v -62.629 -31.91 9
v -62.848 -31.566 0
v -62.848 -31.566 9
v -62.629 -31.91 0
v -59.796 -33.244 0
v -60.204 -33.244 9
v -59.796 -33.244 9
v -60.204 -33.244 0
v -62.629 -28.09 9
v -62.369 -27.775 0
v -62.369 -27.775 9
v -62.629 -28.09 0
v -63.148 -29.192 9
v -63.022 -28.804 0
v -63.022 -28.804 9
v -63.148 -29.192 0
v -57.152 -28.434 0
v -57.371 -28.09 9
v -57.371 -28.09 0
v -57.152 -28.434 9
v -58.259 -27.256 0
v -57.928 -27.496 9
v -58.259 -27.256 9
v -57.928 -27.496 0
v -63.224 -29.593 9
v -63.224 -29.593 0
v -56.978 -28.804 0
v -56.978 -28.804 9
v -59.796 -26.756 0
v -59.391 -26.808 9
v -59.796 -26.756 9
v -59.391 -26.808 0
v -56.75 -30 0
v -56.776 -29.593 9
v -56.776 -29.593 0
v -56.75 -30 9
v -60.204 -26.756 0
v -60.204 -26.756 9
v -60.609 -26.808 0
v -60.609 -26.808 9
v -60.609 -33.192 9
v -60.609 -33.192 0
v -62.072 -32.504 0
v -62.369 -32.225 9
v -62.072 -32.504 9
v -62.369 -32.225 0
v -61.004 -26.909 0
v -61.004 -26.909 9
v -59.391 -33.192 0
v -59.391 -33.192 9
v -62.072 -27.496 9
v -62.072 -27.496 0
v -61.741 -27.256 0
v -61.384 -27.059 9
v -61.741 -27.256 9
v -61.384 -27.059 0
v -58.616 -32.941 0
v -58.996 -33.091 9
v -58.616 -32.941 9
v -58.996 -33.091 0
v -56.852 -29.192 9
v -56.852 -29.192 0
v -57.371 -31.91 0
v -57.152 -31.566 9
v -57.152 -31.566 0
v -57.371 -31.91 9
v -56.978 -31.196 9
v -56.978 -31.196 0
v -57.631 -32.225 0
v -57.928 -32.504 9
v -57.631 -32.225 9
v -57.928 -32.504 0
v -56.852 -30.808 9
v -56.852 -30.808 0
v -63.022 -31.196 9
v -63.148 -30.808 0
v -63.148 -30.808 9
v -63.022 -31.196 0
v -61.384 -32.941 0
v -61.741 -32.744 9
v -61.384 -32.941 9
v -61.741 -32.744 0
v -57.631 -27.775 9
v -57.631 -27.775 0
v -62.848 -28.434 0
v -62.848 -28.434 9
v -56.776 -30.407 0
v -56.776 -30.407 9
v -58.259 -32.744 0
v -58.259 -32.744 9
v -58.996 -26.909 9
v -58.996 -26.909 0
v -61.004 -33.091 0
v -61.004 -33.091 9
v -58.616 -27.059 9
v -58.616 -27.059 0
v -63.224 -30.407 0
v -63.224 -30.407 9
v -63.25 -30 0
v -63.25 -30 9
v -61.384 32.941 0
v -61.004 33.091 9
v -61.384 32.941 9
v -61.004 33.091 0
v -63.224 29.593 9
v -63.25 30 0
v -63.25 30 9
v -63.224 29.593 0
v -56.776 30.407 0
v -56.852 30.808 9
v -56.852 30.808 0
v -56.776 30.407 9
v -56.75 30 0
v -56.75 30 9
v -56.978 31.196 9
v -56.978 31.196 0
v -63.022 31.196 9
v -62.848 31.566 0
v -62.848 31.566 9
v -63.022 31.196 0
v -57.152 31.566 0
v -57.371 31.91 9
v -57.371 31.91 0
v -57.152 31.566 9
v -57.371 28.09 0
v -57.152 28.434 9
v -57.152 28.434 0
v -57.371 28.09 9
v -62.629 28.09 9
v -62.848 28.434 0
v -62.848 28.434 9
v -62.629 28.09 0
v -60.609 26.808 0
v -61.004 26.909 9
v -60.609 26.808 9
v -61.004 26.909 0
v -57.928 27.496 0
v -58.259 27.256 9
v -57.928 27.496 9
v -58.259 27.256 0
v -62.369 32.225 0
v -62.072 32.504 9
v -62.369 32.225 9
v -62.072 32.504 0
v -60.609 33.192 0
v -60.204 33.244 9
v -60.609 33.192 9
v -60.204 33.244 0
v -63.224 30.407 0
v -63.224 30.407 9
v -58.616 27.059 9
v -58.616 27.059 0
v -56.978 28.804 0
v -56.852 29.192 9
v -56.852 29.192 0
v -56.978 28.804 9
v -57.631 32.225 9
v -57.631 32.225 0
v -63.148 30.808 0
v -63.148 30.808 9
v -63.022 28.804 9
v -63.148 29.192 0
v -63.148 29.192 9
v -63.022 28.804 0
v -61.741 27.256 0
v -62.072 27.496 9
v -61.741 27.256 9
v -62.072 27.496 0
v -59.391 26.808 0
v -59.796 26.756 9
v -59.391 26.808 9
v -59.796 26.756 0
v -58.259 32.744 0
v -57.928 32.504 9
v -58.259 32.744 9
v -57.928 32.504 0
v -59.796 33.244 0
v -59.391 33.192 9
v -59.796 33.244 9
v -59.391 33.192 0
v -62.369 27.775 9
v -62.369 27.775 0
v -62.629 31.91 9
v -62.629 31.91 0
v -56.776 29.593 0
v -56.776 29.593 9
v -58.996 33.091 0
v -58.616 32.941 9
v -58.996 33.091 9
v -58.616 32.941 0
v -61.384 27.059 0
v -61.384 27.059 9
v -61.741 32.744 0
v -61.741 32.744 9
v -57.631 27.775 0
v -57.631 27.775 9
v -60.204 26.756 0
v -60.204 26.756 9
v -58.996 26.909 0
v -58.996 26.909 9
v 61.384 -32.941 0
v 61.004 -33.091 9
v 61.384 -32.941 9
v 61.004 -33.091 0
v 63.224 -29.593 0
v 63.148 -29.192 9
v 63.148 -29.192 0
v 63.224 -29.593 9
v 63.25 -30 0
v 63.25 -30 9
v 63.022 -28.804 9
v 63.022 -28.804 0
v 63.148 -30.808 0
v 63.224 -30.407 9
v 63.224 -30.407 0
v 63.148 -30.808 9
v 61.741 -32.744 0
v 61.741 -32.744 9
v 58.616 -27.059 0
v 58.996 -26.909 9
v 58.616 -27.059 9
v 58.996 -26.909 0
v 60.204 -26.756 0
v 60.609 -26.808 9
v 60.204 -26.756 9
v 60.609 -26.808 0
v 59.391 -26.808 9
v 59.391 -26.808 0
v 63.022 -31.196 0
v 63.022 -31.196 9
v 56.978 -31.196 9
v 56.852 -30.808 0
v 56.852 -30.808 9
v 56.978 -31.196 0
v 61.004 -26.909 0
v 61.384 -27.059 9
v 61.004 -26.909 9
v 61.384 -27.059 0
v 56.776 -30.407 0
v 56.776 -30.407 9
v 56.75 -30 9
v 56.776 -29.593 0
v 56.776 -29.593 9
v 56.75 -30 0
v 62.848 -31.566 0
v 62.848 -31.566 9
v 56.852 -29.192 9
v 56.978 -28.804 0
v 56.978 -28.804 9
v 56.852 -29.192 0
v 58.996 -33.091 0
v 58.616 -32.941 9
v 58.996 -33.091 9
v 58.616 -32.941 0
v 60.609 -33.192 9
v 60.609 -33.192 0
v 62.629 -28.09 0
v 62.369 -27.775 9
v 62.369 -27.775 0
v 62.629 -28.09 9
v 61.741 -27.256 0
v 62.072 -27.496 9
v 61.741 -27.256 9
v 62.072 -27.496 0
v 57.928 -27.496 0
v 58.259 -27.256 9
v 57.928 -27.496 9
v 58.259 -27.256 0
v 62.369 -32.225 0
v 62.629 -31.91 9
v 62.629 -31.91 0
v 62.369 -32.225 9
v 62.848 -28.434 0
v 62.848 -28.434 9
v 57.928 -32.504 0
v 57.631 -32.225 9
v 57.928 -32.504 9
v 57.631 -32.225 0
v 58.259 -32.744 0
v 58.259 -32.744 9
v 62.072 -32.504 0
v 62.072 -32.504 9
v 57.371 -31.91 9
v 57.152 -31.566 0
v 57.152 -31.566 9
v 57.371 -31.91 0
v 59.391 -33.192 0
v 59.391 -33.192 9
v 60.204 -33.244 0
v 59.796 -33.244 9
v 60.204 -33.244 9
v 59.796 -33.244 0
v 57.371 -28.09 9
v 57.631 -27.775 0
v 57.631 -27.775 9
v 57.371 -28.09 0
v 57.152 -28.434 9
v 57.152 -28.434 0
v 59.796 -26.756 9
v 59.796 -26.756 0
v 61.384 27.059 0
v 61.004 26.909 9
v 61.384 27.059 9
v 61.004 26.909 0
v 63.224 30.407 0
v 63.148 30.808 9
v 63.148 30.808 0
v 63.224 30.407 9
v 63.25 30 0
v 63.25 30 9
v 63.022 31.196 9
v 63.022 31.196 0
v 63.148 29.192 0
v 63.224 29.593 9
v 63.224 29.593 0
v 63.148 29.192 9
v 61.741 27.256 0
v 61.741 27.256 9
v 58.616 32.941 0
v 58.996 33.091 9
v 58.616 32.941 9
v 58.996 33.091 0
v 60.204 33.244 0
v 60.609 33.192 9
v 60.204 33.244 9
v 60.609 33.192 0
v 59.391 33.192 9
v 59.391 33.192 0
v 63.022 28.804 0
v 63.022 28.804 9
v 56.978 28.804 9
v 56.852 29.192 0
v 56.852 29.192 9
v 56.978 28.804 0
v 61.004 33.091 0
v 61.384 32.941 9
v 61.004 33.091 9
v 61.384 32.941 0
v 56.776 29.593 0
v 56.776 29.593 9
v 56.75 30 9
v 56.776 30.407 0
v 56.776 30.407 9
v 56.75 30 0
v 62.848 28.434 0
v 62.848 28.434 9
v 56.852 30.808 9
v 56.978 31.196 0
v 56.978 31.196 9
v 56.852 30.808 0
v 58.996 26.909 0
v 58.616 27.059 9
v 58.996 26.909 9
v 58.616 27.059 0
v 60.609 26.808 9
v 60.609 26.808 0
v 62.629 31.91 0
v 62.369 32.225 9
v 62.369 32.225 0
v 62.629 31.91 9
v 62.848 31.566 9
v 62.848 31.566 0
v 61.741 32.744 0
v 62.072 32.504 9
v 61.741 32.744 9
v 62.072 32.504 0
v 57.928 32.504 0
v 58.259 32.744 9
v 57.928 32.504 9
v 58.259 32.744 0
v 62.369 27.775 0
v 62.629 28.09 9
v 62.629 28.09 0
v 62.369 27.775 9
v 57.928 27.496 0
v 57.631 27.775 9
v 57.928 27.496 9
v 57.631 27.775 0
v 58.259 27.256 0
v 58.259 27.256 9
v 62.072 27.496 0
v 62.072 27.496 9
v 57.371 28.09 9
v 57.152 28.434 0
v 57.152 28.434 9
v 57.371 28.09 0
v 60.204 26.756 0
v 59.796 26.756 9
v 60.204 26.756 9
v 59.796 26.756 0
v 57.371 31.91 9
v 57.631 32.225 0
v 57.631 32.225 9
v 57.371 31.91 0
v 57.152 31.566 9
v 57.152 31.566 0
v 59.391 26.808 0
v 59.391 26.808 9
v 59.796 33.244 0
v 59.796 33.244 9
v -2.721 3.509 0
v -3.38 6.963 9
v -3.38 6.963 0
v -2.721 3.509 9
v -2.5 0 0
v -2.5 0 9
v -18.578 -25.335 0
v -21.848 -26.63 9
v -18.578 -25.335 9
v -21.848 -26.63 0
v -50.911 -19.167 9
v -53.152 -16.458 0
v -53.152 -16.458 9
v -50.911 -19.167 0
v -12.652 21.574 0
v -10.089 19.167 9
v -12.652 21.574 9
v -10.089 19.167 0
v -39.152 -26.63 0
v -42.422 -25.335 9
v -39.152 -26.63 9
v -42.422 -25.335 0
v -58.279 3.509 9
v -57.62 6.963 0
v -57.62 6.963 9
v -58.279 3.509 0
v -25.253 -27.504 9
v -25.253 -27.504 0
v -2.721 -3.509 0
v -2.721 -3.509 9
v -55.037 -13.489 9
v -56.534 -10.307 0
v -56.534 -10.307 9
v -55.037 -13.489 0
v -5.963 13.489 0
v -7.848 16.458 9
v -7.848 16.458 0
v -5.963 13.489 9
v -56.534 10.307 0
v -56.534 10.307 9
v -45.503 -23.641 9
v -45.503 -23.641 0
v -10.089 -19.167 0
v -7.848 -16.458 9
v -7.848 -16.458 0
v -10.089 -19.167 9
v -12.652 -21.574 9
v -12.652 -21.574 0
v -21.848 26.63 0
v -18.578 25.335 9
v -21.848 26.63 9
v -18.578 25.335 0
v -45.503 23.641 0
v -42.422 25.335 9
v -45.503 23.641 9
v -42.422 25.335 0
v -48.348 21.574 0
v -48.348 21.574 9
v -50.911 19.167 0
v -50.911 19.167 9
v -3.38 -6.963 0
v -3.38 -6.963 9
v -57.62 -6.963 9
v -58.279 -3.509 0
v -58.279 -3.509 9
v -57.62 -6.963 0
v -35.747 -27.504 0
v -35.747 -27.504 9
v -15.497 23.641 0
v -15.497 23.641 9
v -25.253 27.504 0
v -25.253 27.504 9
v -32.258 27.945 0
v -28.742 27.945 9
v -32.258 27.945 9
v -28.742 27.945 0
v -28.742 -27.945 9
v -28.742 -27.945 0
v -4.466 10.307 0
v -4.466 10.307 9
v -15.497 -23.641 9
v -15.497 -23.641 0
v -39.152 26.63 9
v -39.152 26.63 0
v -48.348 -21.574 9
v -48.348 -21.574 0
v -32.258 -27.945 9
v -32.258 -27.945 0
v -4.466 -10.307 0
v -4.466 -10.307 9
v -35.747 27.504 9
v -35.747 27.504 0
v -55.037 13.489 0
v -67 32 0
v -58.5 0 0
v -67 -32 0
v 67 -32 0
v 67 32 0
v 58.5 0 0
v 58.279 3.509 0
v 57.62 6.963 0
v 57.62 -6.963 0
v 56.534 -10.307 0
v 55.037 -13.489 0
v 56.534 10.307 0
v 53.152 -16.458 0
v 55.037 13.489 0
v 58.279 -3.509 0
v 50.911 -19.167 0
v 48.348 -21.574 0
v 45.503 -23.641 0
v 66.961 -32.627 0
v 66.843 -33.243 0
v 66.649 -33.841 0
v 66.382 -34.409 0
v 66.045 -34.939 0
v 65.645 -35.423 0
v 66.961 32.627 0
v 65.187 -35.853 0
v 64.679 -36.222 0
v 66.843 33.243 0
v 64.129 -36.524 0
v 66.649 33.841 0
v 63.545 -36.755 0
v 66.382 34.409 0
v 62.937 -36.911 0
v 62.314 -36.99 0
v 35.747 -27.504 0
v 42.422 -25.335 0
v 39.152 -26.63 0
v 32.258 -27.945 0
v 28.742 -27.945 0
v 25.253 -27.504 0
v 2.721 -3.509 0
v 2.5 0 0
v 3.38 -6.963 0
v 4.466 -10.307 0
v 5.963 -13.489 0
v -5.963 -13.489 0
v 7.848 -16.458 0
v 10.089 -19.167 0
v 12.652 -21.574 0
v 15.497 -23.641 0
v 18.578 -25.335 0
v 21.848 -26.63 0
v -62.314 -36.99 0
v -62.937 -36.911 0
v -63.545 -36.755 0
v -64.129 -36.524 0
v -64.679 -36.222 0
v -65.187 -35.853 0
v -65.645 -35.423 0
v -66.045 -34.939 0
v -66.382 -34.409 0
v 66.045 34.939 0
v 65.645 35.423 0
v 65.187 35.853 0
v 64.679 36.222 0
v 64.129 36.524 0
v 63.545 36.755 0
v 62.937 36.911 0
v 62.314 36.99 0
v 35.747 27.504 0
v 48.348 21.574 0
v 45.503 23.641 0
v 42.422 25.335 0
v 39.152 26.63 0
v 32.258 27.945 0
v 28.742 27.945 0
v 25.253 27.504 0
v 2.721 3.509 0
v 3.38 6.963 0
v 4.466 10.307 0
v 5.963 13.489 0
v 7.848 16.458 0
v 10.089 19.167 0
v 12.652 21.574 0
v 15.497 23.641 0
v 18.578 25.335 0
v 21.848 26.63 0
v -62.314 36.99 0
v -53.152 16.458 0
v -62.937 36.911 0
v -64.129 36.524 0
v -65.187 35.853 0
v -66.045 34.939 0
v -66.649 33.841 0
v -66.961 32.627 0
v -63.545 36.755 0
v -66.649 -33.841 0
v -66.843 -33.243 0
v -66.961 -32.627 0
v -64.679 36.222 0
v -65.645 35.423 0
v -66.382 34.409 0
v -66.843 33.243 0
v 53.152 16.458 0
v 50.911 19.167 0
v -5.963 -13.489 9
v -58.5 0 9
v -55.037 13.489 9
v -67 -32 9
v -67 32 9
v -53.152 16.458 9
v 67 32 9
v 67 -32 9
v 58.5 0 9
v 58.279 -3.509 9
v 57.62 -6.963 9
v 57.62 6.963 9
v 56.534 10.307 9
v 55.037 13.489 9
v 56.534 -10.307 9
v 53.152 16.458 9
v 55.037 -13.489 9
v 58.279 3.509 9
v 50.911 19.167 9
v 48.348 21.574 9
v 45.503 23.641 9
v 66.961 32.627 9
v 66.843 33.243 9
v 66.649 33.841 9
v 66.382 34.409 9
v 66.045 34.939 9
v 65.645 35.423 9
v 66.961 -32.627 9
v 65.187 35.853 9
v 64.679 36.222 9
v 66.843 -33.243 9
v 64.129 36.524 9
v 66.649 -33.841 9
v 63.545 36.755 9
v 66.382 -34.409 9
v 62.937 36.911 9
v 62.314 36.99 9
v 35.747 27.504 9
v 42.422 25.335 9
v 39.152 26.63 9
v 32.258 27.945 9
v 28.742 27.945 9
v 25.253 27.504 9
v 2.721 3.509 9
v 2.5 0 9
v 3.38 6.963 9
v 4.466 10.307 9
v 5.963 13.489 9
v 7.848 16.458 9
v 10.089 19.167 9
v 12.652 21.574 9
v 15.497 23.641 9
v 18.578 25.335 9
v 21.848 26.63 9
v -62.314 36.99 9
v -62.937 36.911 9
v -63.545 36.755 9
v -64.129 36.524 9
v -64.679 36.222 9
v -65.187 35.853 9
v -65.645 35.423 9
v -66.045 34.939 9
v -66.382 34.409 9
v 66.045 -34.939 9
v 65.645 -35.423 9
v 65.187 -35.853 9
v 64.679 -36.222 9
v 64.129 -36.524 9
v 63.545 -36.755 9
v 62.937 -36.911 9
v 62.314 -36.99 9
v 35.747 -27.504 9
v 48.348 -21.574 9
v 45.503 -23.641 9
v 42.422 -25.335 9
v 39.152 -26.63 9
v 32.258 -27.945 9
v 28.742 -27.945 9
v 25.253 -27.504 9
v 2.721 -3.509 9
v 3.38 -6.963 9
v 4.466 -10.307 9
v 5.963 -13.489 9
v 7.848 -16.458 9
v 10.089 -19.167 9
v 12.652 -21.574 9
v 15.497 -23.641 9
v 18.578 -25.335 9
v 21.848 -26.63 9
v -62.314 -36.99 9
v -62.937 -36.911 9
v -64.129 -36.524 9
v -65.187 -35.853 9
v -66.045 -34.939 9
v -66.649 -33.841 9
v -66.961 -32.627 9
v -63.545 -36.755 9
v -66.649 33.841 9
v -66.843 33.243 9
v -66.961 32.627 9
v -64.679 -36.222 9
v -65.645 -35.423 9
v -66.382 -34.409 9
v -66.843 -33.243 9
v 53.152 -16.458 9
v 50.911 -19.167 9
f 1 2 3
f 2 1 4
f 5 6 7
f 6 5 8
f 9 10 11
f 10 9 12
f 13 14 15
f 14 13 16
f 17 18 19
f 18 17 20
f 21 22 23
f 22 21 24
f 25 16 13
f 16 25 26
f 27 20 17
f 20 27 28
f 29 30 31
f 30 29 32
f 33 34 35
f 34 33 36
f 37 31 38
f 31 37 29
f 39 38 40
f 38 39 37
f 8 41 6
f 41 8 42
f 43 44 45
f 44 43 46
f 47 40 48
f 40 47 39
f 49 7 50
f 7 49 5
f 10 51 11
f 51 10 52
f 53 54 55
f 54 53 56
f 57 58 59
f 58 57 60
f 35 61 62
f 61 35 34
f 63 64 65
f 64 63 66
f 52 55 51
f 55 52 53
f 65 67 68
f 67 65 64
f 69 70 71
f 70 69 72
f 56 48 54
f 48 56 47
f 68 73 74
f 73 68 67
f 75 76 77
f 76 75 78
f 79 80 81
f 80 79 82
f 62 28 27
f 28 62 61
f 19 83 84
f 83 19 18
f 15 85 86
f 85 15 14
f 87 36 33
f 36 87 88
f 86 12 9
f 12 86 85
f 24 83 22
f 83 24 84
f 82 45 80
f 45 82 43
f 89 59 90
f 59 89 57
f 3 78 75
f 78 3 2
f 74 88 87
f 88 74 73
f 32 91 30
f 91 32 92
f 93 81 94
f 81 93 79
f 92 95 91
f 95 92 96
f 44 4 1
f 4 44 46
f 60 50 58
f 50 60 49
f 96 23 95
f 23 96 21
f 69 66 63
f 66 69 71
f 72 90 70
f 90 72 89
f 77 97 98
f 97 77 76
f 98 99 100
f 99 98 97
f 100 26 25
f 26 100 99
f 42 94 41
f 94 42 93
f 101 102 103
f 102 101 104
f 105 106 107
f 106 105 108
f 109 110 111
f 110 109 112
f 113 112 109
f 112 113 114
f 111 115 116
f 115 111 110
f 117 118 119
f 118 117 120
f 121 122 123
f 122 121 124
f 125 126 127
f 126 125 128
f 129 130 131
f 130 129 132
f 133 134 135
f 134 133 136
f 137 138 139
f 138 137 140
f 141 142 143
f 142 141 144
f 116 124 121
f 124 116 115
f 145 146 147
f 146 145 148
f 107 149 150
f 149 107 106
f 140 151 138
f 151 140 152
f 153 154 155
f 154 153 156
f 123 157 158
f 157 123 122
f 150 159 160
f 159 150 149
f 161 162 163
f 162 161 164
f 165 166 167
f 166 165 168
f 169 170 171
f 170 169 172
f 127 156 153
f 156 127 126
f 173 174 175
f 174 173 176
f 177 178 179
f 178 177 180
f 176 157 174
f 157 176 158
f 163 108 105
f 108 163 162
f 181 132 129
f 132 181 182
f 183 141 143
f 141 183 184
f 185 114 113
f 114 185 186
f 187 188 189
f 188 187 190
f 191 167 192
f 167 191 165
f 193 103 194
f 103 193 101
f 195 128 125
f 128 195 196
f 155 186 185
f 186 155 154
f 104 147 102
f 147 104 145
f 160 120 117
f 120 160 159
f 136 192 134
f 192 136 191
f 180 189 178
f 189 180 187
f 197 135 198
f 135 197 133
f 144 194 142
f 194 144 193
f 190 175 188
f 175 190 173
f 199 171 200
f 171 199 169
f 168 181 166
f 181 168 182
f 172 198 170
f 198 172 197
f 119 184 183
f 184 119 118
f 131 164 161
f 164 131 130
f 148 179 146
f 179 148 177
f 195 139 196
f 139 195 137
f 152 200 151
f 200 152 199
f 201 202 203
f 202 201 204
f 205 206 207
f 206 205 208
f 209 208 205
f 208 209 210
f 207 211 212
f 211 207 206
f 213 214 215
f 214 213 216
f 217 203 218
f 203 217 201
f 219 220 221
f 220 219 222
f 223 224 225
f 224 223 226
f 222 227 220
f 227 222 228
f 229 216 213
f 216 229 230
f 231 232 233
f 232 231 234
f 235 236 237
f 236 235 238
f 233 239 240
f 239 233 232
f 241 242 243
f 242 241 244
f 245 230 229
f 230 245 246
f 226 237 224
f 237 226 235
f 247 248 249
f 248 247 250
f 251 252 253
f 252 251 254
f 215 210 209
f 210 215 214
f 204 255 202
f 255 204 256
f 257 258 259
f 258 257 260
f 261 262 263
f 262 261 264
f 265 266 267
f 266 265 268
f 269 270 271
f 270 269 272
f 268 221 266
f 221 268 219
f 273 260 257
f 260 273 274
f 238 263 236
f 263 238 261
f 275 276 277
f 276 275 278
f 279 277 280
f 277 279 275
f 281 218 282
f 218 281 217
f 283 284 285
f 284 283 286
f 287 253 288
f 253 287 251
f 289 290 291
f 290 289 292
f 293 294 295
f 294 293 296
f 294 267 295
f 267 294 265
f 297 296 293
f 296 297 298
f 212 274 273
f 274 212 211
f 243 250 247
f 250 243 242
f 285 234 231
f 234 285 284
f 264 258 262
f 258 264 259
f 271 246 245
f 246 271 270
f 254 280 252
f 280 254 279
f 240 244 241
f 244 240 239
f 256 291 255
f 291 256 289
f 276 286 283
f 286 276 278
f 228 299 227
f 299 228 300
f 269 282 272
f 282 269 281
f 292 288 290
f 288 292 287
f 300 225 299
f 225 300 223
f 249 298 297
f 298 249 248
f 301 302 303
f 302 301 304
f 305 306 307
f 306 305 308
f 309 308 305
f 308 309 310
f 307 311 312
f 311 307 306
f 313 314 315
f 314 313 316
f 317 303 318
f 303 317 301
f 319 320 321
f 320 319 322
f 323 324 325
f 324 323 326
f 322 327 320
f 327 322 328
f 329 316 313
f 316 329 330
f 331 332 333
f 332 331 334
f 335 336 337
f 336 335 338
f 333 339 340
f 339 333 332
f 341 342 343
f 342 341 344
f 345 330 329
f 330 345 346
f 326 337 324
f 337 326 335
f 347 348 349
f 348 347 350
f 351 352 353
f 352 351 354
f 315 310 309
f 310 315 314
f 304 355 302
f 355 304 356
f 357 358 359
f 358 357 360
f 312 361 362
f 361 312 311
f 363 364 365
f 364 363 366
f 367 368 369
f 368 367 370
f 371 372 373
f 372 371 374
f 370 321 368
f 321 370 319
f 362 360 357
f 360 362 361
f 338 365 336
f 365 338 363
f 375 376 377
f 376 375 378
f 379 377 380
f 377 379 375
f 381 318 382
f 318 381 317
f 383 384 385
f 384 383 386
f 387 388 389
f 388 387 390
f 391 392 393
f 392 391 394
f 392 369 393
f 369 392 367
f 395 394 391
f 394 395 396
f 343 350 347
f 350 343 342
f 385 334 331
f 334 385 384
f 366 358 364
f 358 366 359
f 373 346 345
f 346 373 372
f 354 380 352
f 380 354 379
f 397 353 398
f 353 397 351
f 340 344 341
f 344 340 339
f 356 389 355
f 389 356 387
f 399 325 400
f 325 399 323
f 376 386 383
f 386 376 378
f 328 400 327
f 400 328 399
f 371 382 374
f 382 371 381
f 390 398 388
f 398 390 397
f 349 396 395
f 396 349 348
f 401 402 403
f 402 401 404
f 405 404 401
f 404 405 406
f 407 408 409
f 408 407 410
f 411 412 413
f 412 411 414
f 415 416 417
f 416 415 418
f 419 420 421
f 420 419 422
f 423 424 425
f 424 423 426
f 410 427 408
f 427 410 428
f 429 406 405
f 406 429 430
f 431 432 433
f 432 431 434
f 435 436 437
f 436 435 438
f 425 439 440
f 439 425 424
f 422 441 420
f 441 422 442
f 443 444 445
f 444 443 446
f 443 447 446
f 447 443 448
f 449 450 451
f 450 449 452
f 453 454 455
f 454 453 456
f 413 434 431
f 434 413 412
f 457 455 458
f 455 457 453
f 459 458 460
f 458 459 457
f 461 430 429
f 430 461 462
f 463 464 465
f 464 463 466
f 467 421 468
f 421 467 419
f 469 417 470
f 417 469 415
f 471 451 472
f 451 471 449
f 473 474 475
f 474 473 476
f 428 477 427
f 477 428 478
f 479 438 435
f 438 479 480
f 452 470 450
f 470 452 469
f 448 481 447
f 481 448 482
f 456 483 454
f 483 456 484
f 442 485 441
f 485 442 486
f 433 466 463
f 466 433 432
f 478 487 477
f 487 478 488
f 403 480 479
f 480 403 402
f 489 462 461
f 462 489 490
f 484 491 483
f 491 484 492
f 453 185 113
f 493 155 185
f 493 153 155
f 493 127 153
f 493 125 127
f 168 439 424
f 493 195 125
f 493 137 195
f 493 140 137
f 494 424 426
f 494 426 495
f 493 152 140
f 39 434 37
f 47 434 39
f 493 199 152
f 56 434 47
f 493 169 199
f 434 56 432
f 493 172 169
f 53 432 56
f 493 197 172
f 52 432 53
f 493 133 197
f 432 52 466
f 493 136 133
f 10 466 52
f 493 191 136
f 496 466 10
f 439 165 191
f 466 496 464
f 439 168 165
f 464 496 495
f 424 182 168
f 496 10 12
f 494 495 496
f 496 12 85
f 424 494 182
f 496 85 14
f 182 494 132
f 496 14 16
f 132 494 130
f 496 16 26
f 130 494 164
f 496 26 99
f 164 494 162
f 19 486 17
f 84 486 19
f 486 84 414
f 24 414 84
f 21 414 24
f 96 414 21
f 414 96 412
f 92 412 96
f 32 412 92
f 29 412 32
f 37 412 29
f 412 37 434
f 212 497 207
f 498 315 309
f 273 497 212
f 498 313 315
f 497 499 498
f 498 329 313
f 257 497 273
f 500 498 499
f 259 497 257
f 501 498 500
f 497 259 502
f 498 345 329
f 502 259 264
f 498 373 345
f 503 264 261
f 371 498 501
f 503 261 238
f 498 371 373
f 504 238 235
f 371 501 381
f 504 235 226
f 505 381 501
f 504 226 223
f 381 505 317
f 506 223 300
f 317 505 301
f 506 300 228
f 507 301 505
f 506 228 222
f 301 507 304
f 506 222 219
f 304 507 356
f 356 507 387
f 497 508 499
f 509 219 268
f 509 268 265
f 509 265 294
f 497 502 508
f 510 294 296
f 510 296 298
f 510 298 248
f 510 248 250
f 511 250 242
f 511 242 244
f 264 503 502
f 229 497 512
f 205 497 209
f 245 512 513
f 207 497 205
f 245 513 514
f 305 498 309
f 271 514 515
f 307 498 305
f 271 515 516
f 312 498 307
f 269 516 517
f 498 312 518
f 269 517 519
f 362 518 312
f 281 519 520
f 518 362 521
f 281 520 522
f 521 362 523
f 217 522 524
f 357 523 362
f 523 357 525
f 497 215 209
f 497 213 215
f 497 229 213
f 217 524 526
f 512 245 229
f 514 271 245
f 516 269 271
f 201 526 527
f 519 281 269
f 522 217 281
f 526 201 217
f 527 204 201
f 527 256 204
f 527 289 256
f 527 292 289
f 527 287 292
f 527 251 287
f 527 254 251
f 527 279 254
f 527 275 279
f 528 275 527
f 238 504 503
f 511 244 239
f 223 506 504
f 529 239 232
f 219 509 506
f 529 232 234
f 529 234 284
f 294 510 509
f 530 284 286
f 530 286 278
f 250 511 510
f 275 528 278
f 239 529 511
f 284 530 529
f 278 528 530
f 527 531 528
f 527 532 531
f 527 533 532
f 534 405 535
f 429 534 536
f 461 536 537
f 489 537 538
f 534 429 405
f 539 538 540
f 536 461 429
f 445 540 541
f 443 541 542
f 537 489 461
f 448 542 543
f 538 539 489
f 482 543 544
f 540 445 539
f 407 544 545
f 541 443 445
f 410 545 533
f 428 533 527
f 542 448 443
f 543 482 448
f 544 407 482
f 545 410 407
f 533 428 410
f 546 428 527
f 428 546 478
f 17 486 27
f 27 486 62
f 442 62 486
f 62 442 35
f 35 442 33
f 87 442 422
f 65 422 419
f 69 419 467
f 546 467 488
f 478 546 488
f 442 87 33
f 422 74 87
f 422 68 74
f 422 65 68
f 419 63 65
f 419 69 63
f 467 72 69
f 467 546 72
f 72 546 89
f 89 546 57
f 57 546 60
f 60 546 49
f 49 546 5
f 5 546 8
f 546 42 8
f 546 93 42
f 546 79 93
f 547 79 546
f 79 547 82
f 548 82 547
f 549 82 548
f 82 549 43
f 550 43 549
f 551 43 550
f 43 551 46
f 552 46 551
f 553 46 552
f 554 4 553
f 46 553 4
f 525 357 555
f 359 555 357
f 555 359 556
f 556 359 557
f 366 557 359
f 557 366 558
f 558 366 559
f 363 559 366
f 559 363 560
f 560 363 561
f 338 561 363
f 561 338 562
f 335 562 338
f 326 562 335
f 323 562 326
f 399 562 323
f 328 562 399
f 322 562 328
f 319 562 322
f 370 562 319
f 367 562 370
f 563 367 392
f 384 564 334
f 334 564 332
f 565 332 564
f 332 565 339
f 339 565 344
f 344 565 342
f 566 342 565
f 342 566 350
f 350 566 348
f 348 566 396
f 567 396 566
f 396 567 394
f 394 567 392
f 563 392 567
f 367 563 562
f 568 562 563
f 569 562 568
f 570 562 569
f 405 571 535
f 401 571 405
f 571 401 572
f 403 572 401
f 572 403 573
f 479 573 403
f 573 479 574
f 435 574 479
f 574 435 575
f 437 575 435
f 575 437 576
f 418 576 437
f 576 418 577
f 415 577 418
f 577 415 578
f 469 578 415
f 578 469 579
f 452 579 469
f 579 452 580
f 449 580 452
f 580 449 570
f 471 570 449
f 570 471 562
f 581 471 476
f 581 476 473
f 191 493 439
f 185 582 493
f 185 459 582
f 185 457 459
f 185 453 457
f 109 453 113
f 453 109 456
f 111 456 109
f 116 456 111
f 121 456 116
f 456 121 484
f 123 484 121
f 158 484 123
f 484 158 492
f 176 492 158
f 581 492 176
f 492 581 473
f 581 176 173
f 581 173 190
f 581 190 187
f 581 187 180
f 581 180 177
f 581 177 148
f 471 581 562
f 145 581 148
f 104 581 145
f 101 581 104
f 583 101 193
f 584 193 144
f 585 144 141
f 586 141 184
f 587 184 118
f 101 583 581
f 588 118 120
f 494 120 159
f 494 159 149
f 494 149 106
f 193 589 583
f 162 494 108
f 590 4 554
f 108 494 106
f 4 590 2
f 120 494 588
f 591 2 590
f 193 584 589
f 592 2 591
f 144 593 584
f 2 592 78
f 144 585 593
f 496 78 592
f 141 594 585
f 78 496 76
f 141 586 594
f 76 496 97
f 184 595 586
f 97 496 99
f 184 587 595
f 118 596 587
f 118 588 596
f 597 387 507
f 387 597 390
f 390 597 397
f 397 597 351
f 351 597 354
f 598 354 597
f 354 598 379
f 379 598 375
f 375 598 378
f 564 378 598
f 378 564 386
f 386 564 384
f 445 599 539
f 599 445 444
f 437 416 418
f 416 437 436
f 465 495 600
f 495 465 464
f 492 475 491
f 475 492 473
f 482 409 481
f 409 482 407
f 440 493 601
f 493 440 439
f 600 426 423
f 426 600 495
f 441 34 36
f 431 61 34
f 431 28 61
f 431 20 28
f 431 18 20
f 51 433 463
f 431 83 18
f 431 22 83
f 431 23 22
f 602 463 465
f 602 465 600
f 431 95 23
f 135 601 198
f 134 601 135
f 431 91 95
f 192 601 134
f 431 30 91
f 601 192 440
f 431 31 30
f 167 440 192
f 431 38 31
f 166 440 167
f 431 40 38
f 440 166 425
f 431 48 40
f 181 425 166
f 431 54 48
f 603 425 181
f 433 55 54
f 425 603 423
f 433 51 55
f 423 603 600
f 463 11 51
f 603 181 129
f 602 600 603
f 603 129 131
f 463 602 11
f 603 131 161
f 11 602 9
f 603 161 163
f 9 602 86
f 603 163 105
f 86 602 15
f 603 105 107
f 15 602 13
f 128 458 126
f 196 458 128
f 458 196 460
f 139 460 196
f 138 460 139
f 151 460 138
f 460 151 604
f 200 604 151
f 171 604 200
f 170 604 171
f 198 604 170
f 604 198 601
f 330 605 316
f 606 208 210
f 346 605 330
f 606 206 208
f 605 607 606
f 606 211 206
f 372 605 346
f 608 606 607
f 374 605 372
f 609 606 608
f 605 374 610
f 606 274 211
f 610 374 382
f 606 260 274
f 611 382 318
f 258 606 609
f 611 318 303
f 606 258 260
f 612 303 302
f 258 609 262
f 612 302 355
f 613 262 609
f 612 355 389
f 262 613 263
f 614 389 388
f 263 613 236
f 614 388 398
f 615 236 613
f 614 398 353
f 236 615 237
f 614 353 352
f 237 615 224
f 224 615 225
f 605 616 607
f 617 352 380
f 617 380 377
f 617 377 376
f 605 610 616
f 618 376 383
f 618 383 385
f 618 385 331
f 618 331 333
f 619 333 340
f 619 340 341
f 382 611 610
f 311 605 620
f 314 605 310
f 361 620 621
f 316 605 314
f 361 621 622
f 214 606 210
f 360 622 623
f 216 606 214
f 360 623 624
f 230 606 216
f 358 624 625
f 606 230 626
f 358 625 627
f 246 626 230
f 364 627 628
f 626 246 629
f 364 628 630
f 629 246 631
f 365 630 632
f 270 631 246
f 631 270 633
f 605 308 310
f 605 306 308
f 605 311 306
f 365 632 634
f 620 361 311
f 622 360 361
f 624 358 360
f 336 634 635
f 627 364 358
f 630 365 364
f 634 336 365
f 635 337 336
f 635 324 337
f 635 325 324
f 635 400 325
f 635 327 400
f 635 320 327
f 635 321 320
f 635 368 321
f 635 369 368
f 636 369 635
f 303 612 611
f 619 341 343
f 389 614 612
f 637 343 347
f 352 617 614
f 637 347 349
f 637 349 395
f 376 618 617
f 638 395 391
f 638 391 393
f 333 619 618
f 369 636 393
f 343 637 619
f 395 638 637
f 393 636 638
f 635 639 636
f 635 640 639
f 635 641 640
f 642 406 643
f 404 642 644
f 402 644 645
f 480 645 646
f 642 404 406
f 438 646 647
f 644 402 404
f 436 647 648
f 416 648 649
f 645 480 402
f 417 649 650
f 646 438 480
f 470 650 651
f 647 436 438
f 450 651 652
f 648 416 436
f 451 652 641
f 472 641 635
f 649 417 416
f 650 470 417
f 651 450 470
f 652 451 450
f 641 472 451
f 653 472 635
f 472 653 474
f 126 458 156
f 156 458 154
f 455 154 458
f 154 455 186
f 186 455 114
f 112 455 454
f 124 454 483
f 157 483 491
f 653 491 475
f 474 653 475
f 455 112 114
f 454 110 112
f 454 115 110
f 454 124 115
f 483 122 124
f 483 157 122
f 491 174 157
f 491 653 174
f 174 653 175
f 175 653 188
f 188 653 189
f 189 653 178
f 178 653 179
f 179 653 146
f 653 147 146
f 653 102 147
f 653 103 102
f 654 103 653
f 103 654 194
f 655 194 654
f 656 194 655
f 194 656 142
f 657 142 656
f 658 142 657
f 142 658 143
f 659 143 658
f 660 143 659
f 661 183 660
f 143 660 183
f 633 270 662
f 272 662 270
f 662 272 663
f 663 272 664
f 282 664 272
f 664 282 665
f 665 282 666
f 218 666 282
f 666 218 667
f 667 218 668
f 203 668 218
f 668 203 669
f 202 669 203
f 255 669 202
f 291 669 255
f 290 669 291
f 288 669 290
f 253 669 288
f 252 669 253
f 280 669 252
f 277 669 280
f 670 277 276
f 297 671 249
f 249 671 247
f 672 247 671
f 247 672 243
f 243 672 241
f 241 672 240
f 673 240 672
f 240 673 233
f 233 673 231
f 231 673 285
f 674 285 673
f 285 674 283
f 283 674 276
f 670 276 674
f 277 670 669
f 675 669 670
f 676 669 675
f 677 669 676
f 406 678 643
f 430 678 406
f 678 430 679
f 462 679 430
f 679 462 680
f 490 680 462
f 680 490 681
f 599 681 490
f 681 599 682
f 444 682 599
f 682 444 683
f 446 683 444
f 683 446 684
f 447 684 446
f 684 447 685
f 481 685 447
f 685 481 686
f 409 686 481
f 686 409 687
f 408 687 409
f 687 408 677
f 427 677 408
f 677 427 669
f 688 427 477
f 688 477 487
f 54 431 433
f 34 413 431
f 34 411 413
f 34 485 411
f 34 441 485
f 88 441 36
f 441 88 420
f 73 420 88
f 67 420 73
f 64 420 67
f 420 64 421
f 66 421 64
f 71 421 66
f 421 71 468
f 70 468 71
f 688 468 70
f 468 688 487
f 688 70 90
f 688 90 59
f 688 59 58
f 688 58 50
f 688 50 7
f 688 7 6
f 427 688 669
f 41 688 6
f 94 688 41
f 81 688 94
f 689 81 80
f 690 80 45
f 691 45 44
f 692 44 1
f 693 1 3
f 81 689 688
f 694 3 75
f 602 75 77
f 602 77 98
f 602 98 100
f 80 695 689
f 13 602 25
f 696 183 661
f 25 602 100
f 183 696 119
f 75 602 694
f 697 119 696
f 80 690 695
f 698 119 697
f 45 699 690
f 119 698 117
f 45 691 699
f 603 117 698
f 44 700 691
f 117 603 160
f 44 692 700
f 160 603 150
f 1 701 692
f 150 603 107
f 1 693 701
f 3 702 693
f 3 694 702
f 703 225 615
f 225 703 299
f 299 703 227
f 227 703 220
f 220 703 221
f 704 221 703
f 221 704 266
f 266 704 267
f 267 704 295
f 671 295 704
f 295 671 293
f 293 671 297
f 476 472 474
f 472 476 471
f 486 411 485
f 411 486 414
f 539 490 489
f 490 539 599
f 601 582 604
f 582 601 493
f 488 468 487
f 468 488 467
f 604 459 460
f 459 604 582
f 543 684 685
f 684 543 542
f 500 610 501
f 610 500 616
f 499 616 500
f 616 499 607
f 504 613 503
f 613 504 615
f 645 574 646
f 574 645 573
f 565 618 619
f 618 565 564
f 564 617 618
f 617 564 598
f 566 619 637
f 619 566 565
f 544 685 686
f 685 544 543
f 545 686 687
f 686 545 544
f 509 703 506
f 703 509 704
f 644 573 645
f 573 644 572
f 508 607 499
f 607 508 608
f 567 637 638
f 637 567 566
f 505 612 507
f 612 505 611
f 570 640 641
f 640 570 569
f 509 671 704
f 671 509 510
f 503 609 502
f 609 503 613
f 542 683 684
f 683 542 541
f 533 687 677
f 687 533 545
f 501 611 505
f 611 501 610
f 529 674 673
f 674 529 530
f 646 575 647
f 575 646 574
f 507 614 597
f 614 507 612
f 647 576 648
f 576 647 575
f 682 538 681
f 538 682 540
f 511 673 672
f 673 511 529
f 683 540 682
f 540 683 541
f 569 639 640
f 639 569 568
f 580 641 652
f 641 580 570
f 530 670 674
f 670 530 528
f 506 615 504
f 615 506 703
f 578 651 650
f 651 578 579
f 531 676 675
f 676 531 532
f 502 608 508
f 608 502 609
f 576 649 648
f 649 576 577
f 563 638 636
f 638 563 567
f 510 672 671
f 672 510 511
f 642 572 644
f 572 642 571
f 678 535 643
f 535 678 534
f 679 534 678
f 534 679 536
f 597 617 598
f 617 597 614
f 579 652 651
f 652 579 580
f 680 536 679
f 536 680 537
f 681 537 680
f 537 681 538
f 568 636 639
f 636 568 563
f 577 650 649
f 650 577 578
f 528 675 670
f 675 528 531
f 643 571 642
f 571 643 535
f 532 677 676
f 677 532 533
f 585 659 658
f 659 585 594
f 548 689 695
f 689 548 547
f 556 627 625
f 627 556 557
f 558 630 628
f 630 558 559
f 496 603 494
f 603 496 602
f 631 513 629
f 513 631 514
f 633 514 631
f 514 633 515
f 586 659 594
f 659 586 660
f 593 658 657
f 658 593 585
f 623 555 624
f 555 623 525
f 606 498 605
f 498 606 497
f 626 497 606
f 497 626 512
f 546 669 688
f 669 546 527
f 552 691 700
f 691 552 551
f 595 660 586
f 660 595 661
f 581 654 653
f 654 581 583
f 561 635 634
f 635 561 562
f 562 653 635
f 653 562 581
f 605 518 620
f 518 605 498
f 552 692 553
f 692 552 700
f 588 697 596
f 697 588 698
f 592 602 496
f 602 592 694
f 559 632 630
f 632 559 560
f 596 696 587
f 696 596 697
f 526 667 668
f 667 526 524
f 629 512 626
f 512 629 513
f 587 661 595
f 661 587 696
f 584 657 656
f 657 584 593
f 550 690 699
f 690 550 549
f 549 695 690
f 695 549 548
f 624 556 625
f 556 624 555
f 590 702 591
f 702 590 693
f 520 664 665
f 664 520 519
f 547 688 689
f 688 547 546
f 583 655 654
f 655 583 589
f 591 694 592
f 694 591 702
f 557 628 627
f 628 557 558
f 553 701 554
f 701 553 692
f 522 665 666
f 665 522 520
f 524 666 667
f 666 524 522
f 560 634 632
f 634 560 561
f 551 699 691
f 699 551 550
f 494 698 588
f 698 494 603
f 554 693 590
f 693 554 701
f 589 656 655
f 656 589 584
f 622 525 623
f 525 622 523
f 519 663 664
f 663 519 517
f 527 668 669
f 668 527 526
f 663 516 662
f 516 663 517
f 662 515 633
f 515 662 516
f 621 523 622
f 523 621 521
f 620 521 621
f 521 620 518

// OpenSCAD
$fn = 50;


difference() {
	union() {
		hull() {
			translate(v = [-62.0000000000, 32.0000000000, 0]) {
				cylinder(h = 9, r = 5);
			}
			translate(v = [62.0000000000, 32.0000000000, 0]) {
				cylinder(h = 9, r = 5);
			}
			translate(v = [-62.0000000000, -32.0000000000, 0]) {
				cylinder(h = 9, r = 5);
			}
			translate(v = [62.0000000000, -32.0000000000, 0]) {
				cylinder(h = 9, r = 5);
			}
		}
	}
	union() {
		#translate(v = [-60.0000000000, -30.0000000000, -100.0000000000]) {
			cylinder(h = 200, r = 3.2500000000);
		}
		#translate(v = [-60.0000000000, 30.0000000000, -100.0000000000]) {
			cylinder(h = 200, r = 3.2500000000);
		}
		#translate(v = [60.0000000000, -30.0000000000, -100.0000000000]) {
			cylinder(h = 200, r = 3.2500000000);
		}
		#translate(v = [60.0000000000, 30.0000000000, -100.0000000000]) {
			cylinder(h = 200, r = 3.2500000000);
		}
		#translate(v = [-30.5000000000, 0, 0]) {
			cylinder(h = 9, r = 28.0000000000);
		}
		#translate(v = [30.5000000000, 0, 0]) {
			cylinder(h = 9, r = 28.0000000000);
		}
	}
}
